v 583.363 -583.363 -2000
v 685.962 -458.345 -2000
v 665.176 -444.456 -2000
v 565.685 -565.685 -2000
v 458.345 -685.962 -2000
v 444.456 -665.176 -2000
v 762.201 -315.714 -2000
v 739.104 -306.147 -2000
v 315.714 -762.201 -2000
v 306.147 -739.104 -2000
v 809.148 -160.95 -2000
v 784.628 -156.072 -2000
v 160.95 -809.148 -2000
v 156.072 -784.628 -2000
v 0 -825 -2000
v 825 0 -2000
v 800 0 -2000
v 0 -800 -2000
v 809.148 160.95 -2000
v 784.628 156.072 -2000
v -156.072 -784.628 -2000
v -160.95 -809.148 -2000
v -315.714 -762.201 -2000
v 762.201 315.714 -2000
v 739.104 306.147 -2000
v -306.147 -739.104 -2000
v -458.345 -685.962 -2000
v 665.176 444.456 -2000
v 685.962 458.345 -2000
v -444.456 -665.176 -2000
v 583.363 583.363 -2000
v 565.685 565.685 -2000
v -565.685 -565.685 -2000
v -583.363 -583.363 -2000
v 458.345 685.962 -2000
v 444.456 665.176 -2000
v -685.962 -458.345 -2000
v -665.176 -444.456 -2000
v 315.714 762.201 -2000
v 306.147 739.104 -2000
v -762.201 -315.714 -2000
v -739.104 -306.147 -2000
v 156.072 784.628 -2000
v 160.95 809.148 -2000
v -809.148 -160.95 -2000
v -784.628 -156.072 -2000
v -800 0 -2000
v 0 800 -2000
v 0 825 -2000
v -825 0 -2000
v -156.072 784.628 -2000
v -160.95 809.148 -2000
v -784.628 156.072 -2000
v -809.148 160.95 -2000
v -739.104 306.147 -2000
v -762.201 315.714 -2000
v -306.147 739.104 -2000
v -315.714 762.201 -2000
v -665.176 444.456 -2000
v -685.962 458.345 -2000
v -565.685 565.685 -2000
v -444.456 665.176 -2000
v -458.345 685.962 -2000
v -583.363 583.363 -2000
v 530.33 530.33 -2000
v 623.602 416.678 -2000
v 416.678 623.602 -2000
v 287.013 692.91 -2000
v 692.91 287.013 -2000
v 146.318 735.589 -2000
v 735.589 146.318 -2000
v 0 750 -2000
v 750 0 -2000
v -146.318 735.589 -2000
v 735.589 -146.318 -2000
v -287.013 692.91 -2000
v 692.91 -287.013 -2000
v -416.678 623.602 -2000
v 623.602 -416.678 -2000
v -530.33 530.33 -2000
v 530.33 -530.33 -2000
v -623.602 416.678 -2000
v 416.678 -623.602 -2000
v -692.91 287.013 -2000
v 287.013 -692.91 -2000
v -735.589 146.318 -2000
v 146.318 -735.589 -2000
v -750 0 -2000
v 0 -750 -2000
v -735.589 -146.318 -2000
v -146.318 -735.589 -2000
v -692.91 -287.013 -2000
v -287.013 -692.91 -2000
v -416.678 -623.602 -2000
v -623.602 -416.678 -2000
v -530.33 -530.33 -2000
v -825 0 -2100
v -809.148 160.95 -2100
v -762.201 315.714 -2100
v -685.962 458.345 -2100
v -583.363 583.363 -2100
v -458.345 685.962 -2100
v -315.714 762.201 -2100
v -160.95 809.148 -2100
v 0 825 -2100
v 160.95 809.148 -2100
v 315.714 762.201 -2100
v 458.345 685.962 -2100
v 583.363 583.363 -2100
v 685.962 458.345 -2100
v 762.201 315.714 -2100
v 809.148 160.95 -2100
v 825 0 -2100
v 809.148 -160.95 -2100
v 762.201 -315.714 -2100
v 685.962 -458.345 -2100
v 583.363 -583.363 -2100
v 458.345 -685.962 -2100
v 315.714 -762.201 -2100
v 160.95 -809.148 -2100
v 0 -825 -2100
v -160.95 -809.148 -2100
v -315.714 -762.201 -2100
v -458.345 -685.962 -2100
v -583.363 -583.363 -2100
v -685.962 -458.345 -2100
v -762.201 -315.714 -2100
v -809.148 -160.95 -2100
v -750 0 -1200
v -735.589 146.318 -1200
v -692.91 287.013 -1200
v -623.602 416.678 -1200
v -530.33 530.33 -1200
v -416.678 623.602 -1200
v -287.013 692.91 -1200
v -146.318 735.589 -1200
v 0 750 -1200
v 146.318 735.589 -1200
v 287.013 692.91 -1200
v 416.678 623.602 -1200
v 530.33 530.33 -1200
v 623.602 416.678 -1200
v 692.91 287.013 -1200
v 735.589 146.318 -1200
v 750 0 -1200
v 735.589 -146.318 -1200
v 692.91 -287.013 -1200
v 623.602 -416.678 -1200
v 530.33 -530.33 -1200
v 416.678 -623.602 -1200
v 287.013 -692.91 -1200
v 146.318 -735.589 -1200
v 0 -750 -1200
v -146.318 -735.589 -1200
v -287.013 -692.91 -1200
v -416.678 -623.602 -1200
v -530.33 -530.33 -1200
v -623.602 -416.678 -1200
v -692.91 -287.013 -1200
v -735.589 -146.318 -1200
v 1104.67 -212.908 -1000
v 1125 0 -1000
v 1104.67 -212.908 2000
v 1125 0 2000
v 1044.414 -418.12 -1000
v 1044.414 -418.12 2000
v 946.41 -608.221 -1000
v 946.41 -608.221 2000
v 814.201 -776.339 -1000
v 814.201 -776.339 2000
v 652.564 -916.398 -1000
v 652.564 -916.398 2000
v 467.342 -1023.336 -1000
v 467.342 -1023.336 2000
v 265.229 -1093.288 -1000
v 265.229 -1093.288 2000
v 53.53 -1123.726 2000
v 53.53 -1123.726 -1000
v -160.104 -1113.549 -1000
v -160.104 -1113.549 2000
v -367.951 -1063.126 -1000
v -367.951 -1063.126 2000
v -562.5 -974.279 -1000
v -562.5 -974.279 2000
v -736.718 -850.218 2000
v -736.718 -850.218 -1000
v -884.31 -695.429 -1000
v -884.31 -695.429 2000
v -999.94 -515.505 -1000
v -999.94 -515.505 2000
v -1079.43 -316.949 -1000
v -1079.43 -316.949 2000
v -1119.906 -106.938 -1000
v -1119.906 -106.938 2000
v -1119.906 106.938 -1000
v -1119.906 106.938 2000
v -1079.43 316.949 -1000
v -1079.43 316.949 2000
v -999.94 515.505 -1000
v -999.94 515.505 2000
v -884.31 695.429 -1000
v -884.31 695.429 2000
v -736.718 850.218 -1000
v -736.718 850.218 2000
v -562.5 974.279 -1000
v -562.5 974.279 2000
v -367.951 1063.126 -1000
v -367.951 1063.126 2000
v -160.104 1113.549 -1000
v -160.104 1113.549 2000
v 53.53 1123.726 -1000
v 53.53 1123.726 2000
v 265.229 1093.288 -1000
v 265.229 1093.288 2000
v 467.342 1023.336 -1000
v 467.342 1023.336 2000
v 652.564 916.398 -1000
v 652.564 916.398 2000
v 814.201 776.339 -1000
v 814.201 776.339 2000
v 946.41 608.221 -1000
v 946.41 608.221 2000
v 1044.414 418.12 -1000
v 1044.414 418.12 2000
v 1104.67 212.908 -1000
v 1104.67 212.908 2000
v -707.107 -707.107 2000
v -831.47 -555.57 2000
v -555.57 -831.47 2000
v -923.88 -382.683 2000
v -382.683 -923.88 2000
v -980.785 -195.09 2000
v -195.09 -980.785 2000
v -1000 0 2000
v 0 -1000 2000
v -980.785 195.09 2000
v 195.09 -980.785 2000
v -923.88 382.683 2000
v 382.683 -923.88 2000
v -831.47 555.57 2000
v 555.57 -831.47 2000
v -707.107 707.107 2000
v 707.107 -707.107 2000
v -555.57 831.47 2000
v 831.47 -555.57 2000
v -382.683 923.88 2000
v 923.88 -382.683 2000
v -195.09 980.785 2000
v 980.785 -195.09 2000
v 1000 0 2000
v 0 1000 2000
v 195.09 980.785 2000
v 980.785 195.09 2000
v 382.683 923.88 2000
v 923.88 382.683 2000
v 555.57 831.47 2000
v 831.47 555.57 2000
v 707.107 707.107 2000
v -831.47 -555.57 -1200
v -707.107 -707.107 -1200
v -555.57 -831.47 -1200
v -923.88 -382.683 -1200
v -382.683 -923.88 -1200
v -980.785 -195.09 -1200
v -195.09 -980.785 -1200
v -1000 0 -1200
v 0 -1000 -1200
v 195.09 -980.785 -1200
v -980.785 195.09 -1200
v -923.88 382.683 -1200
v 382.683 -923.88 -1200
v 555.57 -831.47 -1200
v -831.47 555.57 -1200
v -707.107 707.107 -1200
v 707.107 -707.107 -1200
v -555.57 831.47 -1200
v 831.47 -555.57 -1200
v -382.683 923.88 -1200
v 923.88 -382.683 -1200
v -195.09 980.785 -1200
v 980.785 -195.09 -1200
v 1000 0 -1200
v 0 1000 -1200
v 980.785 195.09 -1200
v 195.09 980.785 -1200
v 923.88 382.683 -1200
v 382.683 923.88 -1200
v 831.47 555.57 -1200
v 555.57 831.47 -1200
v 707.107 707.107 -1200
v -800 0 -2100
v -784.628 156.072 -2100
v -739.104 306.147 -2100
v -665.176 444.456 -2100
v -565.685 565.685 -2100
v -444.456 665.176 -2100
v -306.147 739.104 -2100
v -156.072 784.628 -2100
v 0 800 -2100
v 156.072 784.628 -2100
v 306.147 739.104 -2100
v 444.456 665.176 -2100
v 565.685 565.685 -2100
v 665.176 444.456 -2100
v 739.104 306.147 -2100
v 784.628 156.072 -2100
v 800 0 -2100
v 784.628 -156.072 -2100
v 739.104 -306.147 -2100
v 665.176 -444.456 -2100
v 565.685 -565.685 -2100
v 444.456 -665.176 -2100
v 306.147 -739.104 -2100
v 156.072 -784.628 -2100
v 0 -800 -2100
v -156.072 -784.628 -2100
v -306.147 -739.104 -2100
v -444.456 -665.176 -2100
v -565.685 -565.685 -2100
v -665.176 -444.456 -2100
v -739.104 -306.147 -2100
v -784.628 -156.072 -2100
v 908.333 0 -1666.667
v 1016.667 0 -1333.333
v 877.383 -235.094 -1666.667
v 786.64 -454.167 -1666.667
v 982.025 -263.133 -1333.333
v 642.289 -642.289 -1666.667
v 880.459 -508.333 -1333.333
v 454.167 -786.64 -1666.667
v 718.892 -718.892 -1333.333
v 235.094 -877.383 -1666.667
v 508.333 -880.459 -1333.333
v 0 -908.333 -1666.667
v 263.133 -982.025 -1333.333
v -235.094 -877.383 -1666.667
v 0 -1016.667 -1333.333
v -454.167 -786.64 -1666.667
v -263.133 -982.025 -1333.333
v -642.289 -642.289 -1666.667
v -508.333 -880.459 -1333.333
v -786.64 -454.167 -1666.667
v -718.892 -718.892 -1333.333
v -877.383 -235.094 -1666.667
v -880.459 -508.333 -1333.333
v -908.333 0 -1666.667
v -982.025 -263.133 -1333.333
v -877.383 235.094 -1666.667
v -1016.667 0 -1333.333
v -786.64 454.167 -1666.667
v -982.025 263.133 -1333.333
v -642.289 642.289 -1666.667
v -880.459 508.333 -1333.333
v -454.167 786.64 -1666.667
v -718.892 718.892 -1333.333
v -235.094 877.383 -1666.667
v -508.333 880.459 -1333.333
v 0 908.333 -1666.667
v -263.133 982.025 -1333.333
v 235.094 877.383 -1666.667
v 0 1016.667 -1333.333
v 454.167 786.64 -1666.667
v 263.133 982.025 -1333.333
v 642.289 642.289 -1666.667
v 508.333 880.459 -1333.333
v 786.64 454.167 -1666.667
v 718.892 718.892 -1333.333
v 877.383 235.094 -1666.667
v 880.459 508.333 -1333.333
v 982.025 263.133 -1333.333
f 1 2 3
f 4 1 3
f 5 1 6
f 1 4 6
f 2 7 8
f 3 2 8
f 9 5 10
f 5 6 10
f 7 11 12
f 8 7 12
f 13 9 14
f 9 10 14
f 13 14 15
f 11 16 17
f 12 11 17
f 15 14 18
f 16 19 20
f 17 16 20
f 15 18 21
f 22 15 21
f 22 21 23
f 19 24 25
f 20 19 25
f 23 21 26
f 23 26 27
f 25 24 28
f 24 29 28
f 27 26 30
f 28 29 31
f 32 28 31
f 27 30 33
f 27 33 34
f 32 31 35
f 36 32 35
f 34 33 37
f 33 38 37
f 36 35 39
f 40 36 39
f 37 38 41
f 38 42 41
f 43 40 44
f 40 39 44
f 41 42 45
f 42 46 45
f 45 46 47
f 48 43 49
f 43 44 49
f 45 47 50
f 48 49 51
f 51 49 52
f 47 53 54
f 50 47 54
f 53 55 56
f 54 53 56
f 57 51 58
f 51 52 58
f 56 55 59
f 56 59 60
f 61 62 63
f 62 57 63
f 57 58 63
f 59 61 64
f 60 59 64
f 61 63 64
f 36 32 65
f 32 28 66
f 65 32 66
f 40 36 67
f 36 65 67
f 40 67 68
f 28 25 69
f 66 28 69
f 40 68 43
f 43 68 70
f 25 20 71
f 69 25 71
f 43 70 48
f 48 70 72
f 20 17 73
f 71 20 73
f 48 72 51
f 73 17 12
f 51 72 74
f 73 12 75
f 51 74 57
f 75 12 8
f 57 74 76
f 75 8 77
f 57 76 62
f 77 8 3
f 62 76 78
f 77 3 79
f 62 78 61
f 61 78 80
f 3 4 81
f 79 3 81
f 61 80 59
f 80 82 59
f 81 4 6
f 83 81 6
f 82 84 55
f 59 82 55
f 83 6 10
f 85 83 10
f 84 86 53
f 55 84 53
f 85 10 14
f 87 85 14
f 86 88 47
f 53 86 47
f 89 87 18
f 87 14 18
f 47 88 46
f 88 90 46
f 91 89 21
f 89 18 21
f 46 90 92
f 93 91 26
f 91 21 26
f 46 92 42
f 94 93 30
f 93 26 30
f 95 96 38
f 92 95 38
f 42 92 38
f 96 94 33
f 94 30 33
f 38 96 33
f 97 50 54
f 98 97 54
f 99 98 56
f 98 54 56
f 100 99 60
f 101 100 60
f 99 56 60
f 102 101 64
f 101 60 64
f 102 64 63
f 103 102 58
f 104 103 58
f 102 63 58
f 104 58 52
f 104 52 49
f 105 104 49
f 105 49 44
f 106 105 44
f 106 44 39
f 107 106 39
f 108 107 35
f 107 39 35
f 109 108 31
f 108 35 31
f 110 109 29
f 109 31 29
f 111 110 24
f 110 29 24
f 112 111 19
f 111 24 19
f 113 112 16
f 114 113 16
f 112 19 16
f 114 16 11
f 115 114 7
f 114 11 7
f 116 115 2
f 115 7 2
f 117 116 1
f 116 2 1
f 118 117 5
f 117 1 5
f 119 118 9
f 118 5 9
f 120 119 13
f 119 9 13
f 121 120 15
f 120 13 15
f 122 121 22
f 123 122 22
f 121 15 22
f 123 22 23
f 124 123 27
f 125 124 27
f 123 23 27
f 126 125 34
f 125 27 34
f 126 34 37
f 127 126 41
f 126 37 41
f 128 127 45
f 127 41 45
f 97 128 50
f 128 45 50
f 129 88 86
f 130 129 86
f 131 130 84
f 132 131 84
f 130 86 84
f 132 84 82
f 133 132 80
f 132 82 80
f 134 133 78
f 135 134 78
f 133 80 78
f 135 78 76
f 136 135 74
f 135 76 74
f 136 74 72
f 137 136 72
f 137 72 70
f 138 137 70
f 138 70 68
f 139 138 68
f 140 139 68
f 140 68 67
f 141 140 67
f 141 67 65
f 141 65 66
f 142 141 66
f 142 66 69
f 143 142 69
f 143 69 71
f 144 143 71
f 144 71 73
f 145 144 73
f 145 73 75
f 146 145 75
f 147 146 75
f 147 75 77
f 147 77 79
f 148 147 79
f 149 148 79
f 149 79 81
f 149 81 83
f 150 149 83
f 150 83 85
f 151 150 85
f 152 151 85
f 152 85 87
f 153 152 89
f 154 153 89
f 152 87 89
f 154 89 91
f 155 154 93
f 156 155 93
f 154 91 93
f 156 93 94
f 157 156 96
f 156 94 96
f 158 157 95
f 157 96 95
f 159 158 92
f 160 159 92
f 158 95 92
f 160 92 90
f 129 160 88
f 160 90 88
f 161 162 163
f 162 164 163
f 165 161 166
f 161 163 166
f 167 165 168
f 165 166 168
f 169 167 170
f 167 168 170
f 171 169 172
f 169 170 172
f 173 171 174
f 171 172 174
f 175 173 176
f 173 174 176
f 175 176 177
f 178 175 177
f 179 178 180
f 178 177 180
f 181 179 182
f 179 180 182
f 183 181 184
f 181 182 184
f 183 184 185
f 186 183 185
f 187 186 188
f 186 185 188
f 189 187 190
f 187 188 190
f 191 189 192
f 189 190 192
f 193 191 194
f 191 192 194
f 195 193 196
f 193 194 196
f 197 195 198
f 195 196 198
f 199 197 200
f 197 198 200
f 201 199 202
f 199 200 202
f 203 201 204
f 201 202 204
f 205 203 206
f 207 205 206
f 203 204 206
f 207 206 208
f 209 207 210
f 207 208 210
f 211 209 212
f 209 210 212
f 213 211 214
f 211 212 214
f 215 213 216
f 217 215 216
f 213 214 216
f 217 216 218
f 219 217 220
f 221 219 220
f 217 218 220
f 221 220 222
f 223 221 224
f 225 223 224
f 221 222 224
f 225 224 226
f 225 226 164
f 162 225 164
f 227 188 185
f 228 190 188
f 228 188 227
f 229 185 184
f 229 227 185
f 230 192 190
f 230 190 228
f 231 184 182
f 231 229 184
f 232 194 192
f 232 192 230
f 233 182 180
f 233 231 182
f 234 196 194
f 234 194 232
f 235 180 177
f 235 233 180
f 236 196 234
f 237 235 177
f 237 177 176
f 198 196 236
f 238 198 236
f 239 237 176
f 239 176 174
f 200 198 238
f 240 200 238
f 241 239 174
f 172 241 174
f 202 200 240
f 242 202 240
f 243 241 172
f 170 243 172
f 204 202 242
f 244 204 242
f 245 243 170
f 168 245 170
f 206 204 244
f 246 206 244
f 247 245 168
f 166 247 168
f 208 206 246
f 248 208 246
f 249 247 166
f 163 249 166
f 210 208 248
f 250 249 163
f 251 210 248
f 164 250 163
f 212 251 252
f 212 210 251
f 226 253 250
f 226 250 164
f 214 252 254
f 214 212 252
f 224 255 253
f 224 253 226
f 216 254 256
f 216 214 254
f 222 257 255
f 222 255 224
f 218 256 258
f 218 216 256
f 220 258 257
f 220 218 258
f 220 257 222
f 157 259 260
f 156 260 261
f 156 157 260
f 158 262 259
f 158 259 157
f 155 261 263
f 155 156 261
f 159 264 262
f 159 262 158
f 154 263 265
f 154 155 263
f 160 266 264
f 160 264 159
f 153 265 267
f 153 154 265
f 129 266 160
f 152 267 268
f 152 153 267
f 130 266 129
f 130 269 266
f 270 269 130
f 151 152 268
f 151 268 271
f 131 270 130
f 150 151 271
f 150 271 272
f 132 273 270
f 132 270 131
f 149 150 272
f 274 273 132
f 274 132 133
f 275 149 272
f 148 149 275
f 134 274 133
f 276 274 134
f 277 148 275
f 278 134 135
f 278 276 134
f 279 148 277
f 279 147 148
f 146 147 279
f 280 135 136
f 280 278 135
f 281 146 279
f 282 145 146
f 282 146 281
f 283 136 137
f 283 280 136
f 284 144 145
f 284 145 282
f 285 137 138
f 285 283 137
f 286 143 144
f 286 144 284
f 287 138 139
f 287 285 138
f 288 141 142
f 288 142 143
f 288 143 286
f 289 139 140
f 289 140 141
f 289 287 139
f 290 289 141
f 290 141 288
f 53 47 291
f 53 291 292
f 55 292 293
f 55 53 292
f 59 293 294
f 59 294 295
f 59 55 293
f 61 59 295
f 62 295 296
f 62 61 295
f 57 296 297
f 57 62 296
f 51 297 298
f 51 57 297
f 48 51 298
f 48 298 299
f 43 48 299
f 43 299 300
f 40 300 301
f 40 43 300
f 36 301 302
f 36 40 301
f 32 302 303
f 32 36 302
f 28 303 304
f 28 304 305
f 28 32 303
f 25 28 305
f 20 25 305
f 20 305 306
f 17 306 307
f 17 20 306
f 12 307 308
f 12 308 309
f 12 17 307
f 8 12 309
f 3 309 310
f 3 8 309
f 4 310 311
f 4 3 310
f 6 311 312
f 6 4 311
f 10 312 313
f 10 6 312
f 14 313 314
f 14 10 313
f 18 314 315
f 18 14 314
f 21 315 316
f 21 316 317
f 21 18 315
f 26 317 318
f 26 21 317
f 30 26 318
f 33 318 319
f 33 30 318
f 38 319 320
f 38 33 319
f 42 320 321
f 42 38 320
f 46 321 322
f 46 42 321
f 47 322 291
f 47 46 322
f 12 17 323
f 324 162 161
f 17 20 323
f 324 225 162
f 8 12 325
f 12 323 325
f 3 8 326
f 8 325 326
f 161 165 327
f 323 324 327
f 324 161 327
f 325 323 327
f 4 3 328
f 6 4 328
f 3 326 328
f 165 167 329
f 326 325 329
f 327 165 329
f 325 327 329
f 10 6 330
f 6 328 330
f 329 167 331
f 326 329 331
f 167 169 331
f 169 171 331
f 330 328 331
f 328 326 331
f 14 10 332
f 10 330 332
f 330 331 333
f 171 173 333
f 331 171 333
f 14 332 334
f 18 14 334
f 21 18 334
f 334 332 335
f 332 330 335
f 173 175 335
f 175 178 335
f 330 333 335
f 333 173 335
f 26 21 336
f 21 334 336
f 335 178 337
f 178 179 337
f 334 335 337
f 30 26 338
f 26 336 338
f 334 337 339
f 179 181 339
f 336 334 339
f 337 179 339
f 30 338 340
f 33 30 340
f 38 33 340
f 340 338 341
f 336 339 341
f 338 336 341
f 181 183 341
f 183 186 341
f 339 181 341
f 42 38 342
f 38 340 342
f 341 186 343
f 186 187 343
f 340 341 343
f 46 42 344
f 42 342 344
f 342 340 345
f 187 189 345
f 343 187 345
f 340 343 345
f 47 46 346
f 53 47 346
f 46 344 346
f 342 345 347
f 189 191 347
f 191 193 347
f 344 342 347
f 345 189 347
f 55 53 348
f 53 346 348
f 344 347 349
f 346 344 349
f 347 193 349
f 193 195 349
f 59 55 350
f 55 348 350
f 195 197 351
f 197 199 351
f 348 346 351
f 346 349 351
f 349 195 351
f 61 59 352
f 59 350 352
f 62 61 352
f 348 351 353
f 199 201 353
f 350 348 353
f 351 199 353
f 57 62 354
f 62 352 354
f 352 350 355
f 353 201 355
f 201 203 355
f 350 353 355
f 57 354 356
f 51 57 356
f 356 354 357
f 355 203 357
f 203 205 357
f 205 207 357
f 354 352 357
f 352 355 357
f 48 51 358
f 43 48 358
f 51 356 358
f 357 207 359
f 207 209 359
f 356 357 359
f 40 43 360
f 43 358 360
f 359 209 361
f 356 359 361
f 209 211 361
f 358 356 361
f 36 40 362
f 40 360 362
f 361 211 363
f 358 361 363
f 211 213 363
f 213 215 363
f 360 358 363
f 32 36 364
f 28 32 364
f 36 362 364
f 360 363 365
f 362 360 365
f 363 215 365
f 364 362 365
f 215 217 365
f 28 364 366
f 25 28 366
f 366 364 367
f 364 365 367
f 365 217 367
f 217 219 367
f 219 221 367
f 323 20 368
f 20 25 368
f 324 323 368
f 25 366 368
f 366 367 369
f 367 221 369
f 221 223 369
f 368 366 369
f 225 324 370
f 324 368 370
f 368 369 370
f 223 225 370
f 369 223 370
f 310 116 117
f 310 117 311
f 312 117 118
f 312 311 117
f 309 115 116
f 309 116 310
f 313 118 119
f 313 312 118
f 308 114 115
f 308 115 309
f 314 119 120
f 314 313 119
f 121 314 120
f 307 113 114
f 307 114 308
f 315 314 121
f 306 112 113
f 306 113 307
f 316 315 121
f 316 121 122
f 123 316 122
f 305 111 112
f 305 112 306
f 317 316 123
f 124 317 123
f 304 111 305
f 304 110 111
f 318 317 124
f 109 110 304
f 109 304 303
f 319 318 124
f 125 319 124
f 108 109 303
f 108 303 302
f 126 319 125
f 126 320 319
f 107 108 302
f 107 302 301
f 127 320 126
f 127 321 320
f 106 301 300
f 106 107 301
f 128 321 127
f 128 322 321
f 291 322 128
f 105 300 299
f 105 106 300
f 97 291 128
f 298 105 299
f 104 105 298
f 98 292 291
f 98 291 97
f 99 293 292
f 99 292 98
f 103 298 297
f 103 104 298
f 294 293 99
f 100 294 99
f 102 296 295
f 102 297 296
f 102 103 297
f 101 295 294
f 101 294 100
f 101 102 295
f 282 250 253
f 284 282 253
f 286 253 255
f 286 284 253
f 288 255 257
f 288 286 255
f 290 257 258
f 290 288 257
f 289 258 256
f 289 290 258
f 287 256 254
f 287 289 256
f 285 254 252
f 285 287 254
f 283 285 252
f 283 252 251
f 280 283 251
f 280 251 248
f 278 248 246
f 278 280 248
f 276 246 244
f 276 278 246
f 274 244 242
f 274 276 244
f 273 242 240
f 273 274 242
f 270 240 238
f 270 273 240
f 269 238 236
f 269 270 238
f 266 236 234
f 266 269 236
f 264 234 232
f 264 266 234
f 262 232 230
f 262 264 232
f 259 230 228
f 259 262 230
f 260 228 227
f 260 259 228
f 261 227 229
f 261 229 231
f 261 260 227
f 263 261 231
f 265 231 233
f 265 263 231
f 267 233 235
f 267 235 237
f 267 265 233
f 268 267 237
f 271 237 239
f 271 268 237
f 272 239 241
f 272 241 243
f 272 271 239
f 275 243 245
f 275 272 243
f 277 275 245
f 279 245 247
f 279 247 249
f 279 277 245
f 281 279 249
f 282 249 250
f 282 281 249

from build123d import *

# Parameters (mm, degrees)
SKETCH1_R           = 1125
SKETCH1_R_2         = 1000
BOSS_EXTRUDE1_DEPTH = 2000
CUT_EXTRUDE1_START  = -1200
SKETCH3_R           = 1000
CUT_EXTRUDE1_DEPTH  = 1200
SKETCH4_R           = 750
CUT_EXTRUDE2_DEPTH  = 1000
SKETCH5_R           = 825
SKETCH5_R_2         = 800
BOSS_EXTRUDE2_DEPTH = 100


with BuildPart() as part:
    # Sketch1 → Boss-Extrude1 (new body)
    with BuildSketch(Plane.XY):
        Circle(SKETCH1_R)
        Circle(SKETCH1_R_2, mode=Mode.SUBTRACT)
    extrude(amount=BOSS_EXTRUDE1_DEPTH)

    # Sketch2 → Revolve1 (revolve)
    with BuildSketch(Plane(origin=(0, 0, 0), x_dir=(0, 0, -1), z_dir=(1, 0, 0)), mode=Mode.PRIVATE) as revolve1_sk:
        Polygon((0, 0), (2000, 0), (2000, -800), (1000, -1125), (0, -1125), align=None)
    revolve(revolve1_sk.sketch.rotate(Axis((0, 0, 0), (0, 0, -1)), 270), axis=Axis((0, 0, 0), (0, 0, -1)))

    # Sketch3 → Cut-Extrude1 (cut)
    with BuildSketch(Plane.XY.offset(CUT_EXTRUDE1_START)):
        Circle(SKETCH3_R)
    extrude(amount=CUT_EXTRUDE1_DEPTH, mode=Mode.SUBTRACT)

    # Sketch4 → Cut-Extrude2 (cut)
    with BuildSketch(Plane(origin=(0, 0, -2000), x_dir=(-1, 0, 0), z_dir=(0, 0, -1))):
        Circle(SKETCH4_R)
    extrude(amount=-CUT_EXTRUDE2_DEPTH, mode=Mode.SUBTRACT)


with BuildPart() as body_2:
    # Sketch5 → Boss-Extrude2 (new body)
    with BuildSketch(Plane(origin=(0, 0, -2000), x_dir=(-1, 0, 0), z_dir=(0, 0, -1))):
        Circle(SKETCH5_R)
        Circle(SKETCH5_R_2, mode=Mode.SUBTRACT)
    extrude(amount=BOSS_EXTRUDE2_DEPTH)


solid = Compound([part.part, body_2.part])
